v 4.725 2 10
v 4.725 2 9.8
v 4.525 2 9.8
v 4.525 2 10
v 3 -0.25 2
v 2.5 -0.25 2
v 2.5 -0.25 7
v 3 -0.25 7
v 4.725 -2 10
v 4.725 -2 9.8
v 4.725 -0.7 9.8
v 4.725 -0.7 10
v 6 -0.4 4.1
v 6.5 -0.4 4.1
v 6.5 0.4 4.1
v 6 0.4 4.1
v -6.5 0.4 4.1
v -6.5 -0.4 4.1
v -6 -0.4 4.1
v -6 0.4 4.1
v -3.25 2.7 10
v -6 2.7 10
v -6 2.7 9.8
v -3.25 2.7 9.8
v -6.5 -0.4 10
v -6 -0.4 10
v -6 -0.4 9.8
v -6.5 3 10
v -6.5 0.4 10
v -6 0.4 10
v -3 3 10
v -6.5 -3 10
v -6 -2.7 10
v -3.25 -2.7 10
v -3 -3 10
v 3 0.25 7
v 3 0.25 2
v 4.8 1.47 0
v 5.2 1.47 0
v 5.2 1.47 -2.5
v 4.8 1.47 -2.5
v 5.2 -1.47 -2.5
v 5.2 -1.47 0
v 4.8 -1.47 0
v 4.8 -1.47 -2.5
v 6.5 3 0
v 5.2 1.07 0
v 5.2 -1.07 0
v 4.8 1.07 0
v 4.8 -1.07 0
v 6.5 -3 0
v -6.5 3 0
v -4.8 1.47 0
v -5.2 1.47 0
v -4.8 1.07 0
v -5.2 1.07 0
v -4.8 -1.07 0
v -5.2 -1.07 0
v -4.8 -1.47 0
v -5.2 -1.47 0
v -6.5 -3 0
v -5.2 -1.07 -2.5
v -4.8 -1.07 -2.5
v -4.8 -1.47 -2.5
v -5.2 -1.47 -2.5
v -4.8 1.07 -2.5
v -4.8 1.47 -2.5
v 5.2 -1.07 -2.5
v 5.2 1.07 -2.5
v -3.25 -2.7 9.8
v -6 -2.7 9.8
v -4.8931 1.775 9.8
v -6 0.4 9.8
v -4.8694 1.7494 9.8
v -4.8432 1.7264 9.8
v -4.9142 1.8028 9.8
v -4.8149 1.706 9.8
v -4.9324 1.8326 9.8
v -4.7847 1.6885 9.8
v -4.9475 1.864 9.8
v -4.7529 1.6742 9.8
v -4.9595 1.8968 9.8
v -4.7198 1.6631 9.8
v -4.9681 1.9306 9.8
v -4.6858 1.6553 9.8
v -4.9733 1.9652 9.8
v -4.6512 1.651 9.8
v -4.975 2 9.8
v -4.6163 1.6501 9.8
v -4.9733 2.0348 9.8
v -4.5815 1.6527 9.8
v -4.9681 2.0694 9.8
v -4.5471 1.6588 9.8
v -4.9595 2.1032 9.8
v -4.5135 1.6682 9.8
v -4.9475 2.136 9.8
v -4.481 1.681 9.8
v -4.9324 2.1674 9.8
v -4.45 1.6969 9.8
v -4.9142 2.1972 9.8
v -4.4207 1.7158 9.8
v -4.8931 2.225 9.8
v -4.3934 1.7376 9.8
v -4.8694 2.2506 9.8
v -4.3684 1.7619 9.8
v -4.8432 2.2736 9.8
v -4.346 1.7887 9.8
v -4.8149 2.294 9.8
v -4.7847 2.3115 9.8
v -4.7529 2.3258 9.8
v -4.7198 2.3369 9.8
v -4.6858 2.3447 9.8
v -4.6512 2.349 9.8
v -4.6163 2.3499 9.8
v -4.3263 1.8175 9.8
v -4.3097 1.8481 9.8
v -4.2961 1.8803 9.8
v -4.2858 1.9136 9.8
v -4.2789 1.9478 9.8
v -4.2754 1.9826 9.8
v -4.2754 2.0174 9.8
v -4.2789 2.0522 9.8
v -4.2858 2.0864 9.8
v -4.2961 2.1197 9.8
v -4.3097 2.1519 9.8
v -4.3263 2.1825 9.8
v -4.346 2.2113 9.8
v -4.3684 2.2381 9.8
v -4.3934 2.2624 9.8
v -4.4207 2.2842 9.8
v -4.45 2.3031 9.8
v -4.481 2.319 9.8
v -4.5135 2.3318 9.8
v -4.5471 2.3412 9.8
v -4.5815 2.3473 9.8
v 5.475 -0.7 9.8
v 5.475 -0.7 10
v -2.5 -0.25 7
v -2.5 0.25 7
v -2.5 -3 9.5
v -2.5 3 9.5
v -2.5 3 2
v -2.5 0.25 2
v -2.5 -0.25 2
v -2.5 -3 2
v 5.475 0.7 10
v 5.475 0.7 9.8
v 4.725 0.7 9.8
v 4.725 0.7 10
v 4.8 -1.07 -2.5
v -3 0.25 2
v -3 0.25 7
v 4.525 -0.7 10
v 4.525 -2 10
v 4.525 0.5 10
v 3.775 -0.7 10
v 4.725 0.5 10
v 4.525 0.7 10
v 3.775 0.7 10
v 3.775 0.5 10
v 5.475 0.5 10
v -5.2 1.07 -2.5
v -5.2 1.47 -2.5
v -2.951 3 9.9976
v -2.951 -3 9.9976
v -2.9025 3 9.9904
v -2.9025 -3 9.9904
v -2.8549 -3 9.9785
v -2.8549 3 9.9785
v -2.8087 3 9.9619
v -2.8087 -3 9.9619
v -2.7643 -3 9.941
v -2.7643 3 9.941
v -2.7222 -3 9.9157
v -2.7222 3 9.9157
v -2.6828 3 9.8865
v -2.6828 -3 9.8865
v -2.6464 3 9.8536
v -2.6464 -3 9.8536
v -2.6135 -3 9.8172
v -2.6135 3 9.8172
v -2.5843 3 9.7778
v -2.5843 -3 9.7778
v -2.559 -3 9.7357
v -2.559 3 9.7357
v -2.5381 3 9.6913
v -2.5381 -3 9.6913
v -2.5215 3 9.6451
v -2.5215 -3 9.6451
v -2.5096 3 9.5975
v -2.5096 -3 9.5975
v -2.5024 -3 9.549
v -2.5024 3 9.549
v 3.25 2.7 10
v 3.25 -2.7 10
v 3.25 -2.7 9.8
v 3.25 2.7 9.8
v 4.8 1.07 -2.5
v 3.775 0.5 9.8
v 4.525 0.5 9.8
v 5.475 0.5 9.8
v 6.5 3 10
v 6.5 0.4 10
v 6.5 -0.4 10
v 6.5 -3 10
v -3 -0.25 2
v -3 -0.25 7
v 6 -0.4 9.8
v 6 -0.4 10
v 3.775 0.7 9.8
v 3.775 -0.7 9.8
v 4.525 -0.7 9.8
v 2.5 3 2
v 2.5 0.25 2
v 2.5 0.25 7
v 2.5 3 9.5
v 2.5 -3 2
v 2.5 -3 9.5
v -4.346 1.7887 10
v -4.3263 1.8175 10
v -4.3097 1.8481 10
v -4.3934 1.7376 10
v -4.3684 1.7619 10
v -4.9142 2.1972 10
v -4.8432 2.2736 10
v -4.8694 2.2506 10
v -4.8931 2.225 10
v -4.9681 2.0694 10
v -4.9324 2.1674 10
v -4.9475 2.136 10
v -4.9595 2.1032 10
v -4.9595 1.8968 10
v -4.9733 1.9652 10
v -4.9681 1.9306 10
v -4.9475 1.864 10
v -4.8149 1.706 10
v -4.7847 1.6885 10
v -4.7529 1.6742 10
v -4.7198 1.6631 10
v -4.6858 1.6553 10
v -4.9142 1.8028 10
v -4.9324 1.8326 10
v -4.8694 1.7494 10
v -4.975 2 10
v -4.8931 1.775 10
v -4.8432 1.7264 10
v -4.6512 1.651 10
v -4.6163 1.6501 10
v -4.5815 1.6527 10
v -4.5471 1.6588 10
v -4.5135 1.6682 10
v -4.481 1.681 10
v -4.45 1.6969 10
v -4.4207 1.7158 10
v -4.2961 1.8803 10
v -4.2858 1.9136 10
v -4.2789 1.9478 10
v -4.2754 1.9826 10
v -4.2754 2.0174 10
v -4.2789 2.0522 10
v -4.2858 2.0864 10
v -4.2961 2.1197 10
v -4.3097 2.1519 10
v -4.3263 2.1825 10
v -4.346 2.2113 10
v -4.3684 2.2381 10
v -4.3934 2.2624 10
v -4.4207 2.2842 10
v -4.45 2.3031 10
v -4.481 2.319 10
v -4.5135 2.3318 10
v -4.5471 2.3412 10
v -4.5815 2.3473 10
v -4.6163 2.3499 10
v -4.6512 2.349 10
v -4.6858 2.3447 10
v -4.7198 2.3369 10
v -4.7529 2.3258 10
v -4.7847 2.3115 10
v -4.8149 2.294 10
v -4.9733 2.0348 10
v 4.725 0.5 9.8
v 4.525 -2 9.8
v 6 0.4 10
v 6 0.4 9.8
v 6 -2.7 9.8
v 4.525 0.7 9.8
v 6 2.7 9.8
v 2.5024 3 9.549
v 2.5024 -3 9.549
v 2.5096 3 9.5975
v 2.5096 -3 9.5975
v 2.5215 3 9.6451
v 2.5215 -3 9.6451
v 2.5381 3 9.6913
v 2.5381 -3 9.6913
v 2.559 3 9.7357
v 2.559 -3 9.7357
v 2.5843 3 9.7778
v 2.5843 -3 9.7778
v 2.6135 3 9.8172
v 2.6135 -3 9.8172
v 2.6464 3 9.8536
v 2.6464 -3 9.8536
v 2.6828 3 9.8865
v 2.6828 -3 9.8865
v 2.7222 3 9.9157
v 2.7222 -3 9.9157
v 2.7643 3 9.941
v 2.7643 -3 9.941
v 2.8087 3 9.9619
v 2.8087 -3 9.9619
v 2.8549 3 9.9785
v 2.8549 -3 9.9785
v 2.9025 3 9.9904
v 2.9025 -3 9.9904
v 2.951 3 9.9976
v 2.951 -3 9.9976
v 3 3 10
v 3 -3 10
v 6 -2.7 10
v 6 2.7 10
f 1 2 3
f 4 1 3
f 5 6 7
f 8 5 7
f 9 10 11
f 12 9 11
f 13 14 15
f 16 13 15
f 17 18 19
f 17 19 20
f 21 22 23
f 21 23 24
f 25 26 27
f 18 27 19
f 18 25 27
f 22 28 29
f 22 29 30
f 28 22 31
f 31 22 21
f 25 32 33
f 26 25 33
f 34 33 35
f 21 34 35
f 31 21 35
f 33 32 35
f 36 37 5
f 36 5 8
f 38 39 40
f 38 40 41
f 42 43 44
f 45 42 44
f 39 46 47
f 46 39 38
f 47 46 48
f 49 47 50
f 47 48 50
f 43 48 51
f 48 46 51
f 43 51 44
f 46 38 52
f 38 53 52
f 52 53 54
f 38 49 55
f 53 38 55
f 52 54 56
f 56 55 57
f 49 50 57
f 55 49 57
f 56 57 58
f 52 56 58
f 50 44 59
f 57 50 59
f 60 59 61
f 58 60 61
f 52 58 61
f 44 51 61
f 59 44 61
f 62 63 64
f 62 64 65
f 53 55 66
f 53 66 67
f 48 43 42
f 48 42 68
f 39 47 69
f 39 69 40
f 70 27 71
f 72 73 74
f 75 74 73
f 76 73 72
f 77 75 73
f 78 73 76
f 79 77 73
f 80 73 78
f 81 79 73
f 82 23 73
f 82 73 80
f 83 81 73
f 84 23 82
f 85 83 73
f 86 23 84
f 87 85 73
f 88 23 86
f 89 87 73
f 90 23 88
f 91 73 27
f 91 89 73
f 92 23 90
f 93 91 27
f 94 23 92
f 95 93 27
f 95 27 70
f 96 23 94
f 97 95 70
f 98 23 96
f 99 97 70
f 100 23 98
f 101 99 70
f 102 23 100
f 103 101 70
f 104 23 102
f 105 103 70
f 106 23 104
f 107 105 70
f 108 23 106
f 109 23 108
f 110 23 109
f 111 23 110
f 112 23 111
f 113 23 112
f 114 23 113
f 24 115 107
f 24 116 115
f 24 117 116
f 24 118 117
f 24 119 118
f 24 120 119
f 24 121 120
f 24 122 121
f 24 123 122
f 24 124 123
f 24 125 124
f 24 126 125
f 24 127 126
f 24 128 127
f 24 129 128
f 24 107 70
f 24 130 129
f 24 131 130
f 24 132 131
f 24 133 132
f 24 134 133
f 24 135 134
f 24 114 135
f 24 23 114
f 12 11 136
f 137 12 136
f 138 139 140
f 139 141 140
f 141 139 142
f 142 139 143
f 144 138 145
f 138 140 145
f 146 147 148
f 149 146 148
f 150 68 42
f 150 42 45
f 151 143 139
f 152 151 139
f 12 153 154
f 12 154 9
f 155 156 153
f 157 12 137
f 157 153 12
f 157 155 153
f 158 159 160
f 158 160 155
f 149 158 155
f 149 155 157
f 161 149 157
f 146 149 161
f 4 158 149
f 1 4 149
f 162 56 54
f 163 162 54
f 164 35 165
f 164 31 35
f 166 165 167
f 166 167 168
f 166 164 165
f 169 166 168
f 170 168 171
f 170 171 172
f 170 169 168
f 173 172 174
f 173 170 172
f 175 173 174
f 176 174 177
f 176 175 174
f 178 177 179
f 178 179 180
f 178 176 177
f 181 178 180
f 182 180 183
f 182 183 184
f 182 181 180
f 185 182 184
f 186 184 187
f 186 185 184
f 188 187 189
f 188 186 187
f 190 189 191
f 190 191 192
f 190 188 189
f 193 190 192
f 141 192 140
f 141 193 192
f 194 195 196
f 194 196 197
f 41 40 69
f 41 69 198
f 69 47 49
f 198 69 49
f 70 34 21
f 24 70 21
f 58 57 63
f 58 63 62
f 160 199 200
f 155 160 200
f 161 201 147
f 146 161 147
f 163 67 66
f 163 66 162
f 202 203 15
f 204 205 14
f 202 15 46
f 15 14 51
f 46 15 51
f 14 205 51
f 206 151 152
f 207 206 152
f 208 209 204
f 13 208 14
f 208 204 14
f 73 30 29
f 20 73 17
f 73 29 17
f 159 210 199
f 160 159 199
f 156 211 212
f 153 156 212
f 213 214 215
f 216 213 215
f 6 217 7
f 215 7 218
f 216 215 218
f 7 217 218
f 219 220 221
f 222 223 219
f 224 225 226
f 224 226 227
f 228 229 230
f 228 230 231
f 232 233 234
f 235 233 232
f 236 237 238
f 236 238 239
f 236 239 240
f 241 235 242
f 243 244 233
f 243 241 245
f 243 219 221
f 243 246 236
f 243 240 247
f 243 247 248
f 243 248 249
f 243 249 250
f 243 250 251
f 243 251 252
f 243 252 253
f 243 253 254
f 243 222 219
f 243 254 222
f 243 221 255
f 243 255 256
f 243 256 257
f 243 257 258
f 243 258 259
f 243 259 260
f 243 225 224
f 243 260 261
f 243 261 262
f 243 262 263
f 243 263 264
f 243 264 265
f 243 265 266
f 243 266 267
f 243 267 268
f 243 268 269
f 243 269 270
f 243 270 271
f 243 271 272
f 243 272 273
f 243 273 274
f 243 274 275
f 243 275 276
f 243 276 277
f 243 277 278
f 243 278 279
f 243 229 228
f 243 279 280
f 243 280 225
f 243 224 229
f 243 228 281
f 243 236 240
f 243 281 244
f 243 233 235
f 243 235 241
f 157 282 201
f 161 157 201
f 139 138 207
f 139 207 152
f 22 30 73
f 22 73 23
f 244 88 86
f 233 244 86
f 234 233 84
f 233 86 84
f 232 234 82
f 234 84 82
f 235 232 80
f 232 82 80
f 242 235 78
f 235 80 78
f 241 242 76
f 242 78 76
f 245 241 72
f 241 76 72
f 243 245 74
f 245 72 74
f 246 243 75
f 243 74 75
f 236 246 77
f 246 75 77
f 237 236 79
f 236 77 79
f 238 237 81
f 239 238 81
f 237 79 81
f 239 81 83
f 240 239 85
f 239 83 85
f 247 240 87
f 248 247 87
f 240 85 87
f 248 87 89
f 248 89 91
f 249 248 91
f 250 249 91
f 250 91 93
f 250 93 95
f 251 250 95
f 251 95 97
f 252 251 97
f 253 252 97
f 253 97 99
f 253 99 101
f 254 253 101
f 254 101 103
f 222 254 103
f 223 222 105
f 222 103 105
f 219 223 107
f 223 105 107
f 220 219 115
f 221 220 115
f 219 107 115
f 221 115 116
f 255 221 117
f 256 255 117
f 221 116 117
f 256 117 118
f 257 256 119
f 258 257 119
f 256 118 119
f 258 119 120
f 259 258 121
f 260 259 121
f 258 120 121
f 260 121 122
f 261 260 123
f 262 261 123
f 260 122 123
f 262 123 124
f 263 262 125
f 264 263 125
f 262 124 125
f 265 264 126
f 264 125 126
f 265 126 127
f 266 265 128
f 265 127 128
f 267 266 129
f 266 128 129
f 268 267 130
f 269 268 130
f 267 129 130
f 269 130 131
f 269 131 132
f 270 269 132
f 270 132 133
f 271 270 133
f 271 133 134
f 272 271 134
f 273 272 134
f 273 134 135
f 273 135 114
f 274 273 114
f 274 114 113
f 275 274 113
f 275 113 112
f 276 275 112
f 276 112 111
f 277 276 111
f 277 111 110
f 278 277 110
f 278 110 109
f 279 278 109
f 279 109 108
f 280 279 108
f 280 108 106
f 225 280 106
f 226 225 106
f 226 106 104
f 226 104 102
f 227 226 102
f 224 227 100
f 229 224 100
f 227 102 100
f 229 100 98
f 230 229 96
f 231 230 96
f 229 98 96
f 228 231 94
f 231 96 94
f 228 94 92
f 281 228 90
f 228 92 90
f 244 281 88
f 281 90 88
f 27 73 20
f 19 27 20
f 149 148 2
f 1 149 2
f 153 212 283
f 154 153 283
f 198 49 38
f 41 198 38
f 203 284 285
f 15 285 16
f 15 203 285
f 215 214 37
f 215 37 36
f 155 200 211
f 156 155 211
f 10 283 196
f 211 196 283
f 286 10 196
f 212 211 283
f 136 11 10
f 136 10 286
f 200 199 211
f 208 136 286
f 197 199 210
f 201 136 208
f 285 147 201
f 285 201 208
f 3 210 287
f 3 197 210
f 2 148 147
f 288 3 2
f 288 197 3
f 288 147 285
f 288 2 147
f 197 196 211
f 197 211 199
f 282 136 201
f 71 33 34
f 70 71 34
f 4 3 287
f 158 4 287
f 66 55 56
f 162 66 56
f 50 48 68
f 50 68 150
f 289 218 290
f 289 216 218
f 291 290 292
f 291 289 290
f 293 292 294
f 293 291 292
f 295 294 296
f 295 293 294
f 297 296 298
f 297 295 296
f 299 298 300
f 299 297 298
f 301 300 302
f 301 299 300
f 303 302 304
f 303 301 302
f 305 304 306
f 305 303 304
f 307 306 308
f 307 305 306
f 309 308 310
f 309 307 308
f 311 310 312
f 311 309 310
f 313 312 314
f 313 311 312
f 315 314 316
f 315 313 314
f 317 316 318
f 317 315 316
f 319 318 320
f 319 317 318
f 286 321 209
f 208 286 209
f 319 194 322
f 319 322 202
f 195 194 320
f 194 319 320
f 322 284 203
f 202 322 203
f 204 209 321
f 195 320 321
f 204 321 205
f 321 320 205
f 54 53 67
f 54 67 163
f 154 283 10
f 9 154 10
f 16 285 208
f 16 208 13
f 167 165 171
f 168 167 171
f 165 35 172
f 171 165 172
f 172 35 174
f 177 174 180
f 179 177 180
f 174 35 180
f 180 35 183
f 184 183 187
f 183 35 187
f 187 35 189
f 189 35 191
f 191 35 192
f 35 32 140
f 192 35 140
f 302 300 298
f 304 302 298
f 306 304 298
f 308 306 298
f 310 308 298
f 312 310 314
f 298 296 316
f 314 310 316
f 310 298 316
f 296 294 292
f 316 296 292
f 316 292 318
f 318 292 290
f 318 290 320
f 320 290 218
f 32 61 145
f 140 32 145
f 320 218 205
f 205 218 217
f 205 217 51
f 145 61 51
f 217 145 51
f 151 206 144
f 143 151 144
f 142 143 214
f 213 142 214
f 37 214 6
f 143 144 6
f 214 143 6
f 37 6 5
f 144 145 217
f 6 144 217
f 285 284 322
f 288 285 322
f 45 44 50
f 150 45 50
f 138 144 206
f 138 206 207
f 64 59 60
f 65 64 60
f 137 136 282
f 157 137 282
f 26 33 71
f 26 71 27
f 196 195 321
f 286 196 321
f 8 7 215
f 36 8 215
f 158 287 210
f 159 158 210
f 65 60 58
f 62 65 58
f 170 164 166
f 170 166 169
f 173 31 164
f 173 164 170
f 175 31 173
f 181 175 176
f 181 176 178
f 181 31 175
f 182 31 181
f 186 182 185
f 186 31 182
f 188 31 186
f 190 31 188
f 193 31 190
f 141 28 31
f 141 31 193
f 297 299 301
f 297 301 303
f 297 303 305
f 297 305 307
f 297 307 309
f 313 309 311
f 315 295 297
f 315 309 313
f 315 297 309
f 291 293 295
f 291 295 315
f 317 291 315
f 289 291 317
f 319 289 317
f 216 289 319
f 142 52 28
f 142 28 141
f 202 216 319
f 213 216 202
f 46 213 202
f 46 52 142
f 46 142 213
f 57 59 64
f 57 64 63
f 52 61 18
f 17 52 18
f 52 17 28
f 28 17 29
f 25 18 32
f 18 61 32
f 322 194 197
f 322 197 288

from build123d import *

# Parameters (mm, degrees)
EXTRUDE_1_DEPTH      = 3
EXTRUDE_1_DEPTH_BACK = 3
FILLET_1_R           = 0.5
SKETCH_3_W           = 5.9
SKETCH_3_H           = 0.8
CUT_EXTRUDE_1_DEPTH  = 0.5
SKETCH_4_W           = 5
SKETCH_4_H           = 0.5
CUT_EXTRUDE_2_DEPTH  = 0.5
SKETCH_5_W           = 2.75
SKETCH_5_H           = 5.4
CUT_EXTRUDE_3_DEPTH  = 0.2
SKETCH_6_R           = 0.35
EXTRUDE_3_DEPTH      = 0.2
SKETCH_2_W           = 0.4
SKETCH_2_H           = 0.4
EXTRUDE_2_DEPTH      = 2.5


with BuildPart() as part:
    # Эскиз1 → Бобышка-Вытянуть1 (new, two sides: drawn at the far end of the back side and taken through both)
    with BuildSketch(Plane(origin=(0, 0, 0), x_dir=(1, 0, 0), z_dir=(0, 1, 0)).offset(-EXTRUDE_1_DEPTH_BACK)):
        Polygon((6.5, 0), (-6.5, 0), (-6.5, -10), (-2.5, -10), (-2.5, -2), (2.5, -2), (2.5, -10), (6.5, -10), align=None)
    extrude(amount=EXTRUDE_1_DEPTH + EXTRUDE_1_DEPTH_BACK)

    # Скругление1
    fillet_1_edges = [part.edges().sort_by_distance(p)[0] for p in [
        (2.5, 0, 10),
        (-2.5, 0, 10),
    ]]
    fillet(fillet_1_edges, radius=FILLET_1_R)

    # Эскиз3 → Вырез-Вытянуть1 (cut)
    with BuildSketch(Plane(origin=(6.5, 0, 0), x_dir=(0, 0, -1), z_dir=(1, 0, 0))):
        with Locations((-7.05, 0)):
            Rectangle(SKETCH_3_W, SKETCH_3_H)
    cut_extrude_1 = extrude(amount=-CUT_EXTRUDE_1_DEPTH, mode=Mode.SUBTRACT)

    # Эскиз4 → Вырез-Вытянуть2 (cut)
    with BuildSketch(Plane.ZY.offset(-2.5)):
        with Locations((4.5, 0)):
            Rectangle(SKETCH_4_W, SKETCH_4_H)
    cut_extrude_2 = extrude(amount=-CUT_EXTRUDE_2_DEPTH, mode=Mode.SUBTRACT)

    # Зеркальное отражение1: Вырез-Вытянуть1, Вырез-Вытянуть2 across plane
    add(cut_extrude_1.mirror(Plane(origin=(0, 0, 0), x_dir=(0, 0, 1), z_dir=(1, 0, 0))), mode=Mode.SUBTRACT)
    add(cut_extrude_2.mirror(Plane(origin=(0, 0, 0), x_dir=(0, 0, 1), z_dir=(1, 0, 0))), mode=Mode.SUBTRACT)

    # Эскиз5 → Вырез-Вытянуть3 (cut)
    with BuildSketch(Plane.XY.offset(10)):
        with Locations((-4.625, 0)):
            Rectangle(SKETCH_5_W, SKETCH_5_H)
        with Locations((4.625, 0)):
            Rectangle(SKETCH_5_W, SKETCH_5_H)
    extrude(amount=-CUT_EXTRUDE_3_DEPTH, mode=Mode.SUBTRACT)

    # Эскиз6 → Бобышка-Вытянуть3 (add)
    with BuildSketch(Plane.XY.offset(9.8)):
        with Locations(Location((-4.625, 2, 0), (0, 0, 180))):
            Circle(SKETCH_6_R)
        Polygon((4.725, -2), (4.725, -0.7), (5.475, -0.7), (4.725, 0.5), (5.475, 0.5), (5.475, 0.7), (4.725, 0.7), (4.725, 2), (4.525, 2), (4.525, 0.7), (3.775, 0.7), (3.775, 0.5), (4.525, 0.5), (3.775, -0.7), (4.525, -0.7), (4.525, -2), align=None)
    extrude(amount=EXTRUDE_3_DEPTH)

    # Эскиз2 → Бобышка-Вытянуть2 (add)
    with BuildSketch(Plane(origin=(0, 0, 0), x_dir=(-1, 0, 0), z_dir=(0, 0, -1))):
        with Locations((5, 1.27)):
            Rectangle(SKETCH_2_W, SKETCH_2_H)
        with Locations((-5, 1.27)):
            Rectangle(SKETCH_2_W, SKETCH_2_H)
        with Locations((5, -1.27)):
            Rectangle(SKETCH_2_W, SKETCH_2_H)
        with Locations((-5, -1.27)):
            Rectangle(SKETCH_2_W, SKETCH_2_H)
    extrude(amount=EXTRUDE_2_DEPTH)


solid = part.part
